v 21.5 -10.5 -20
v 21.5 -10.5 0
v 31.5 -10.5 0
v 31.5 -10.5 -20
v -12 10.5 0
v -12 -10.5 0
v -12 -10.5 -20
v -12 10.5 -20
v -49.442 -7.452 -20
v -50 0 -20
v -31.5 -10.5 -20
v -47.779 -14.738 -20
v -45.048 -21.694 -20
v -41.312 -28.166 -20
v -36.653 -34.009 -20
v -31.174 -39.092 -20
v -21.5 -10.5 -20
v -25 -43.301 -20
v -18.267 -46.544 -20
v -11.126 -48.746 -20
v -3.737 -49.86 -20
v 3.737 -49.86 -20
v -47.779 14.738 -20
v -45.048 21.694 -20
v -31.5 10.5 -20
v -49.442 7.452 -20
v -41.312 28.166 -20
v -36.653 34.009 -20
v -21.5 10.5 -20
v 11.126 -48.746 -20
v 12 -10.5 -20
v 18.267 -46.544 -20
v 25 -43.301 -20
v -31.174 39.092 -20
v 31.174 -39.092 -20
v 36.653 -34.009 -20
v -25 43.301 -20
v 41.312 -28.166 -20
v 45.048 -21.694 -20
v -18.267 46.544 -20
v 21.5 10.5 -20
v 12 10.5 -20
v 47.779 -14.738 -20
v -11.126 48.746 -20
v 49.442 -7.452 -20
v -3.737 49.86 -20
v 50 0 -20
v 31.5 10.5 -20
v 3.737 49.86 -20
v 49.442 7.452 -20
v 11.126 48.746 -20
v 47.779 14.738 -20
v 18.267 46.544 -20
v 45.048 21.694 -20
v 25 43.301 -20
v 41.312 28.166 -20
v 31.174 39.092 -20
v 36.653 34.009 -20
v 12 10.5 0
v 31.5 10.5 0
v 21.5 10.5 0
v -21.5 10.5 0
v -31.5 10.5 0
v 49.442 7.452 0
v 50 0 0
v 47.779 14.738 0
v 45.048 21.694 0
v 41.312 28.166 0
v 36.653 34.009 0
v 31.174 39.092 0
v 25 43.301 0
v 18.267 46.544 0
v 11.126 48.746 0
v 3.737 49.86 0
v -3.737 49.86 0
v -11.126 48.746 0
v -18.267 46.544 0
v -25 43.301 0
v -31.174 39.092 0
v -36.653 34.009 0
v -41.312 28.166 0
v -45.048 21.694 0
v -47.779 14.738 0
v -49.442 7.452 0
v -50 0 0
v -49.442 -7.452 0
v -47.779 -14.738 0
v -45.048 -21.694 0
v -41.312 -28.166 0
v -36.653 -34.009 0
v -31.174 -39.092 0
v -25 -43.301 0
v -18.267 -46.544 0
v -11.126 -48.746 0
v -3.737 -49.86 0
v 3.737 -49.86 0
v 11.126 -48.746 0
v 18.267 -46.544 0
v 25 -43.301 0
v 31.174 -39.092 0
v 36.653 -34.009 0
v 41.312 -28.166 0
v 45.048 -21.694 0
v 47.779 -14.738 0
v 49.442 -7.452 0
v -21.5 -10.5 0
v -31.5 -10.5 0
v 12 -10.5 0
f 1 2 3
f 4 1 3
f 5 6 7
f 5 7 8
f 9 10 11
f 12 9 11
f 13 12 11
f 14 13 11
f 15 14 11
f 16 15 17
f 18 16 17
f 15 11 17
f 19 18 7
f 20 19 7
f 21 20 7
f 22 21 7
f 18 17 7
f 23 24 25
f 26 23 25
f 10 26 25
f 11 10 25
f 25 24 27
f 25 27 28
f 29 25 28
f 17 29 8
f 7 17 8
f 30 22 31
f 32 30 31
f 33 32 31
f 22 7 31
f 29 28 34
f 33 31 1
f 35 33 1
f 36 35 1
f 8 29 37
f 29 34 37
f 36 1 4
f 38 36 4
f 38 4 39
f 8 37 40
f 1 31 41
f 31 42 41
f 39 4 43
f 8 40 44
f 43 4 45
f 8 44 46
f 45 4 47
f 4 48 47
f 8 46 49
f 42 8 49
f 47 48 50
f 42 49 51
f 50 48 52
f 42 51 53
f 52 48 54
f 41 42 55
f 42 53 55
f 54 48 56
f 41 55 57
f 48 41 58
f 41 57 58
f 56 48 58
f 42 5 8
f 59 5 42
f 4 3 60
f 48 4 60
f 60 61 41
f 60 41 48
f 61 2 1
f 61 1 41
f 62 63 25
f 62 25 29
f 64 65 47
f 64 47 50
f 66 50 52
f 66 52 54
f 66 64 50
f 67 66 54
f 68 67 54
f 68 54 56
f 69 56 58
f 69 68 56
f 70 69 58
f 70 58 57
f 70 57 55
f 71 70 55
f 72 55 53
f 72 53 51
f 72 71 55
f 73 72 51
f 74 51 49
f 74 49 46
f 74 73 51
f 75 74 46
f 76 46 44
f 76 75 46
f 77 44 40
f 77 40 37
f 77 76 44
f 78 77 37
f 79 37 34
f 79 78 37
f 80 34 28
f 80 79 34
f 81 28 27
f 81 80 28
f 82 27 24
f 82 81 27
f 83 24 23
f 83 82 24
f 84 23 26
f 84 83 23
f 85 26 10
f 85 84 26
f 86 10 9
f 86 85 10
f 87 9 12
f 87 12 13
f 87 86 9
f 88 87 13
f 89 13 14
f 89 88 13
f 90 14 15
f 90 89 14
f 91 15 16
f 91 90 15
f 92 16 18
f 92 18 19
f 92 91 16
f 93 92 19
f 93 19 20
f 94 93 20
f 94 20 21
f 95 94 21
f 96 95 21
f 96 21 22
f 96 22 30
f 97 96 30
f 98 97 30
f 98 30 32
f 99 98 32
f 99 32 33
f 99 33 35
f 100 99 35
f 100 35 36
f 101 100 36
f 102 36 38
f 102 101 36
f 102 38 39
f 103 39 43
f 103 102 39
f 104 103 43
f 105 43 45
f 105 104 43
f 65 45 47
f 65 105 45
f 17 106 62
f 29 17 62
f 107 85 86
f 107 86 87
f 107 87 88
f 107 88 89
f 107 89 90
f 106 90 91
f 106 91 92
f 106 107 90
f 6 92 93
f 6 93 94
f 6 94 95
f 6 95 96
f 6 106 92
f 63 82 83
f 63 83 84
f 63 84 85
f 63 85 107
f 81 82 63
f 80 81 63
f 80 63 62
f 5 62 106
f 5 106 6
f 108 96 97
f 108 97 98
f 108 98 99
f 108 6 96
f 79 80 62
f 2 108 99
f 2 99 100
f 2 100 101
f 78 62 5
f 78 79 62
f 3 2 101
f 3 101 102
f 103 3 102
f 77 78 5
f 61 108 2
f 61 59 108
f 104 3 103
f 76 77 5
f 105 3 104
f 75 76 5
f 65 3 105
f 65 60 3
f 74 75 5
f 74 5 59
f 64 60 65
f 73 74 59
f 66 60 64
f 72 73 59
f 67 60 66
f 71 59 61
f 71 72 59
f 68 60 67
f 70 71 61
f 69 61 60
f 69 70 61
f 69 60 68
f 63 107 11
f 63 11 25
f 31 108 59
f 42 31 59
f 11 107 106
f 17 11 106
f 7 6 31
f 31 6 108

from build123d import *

# Parameters (mm, degrees)
F0_R     = 50
F0_W     = 10
F0_H     = 21
F0_W_2   = 24
F1_DEPTH = 20


with BuildPart() as f1:
    # F0 (on Top) → F1 (new body)
    with BuildSketch(Plane.XY):
        Circle(F0_R)
        with Locations((-26.5, 0)):
            Rectangle(F0_W, F0_H, mode=Mode.SUBTRACT)
        Rectangle(F0_W_2, F0_H, mode=Mode.SUBTRACT)
        with Locations((26.5, 0)):
            Rectangle(F0_W, F0_H, mode=Mode.SUBTRACT)
    extrude(amount=-F1_DEPTH)


solid = f1.part
